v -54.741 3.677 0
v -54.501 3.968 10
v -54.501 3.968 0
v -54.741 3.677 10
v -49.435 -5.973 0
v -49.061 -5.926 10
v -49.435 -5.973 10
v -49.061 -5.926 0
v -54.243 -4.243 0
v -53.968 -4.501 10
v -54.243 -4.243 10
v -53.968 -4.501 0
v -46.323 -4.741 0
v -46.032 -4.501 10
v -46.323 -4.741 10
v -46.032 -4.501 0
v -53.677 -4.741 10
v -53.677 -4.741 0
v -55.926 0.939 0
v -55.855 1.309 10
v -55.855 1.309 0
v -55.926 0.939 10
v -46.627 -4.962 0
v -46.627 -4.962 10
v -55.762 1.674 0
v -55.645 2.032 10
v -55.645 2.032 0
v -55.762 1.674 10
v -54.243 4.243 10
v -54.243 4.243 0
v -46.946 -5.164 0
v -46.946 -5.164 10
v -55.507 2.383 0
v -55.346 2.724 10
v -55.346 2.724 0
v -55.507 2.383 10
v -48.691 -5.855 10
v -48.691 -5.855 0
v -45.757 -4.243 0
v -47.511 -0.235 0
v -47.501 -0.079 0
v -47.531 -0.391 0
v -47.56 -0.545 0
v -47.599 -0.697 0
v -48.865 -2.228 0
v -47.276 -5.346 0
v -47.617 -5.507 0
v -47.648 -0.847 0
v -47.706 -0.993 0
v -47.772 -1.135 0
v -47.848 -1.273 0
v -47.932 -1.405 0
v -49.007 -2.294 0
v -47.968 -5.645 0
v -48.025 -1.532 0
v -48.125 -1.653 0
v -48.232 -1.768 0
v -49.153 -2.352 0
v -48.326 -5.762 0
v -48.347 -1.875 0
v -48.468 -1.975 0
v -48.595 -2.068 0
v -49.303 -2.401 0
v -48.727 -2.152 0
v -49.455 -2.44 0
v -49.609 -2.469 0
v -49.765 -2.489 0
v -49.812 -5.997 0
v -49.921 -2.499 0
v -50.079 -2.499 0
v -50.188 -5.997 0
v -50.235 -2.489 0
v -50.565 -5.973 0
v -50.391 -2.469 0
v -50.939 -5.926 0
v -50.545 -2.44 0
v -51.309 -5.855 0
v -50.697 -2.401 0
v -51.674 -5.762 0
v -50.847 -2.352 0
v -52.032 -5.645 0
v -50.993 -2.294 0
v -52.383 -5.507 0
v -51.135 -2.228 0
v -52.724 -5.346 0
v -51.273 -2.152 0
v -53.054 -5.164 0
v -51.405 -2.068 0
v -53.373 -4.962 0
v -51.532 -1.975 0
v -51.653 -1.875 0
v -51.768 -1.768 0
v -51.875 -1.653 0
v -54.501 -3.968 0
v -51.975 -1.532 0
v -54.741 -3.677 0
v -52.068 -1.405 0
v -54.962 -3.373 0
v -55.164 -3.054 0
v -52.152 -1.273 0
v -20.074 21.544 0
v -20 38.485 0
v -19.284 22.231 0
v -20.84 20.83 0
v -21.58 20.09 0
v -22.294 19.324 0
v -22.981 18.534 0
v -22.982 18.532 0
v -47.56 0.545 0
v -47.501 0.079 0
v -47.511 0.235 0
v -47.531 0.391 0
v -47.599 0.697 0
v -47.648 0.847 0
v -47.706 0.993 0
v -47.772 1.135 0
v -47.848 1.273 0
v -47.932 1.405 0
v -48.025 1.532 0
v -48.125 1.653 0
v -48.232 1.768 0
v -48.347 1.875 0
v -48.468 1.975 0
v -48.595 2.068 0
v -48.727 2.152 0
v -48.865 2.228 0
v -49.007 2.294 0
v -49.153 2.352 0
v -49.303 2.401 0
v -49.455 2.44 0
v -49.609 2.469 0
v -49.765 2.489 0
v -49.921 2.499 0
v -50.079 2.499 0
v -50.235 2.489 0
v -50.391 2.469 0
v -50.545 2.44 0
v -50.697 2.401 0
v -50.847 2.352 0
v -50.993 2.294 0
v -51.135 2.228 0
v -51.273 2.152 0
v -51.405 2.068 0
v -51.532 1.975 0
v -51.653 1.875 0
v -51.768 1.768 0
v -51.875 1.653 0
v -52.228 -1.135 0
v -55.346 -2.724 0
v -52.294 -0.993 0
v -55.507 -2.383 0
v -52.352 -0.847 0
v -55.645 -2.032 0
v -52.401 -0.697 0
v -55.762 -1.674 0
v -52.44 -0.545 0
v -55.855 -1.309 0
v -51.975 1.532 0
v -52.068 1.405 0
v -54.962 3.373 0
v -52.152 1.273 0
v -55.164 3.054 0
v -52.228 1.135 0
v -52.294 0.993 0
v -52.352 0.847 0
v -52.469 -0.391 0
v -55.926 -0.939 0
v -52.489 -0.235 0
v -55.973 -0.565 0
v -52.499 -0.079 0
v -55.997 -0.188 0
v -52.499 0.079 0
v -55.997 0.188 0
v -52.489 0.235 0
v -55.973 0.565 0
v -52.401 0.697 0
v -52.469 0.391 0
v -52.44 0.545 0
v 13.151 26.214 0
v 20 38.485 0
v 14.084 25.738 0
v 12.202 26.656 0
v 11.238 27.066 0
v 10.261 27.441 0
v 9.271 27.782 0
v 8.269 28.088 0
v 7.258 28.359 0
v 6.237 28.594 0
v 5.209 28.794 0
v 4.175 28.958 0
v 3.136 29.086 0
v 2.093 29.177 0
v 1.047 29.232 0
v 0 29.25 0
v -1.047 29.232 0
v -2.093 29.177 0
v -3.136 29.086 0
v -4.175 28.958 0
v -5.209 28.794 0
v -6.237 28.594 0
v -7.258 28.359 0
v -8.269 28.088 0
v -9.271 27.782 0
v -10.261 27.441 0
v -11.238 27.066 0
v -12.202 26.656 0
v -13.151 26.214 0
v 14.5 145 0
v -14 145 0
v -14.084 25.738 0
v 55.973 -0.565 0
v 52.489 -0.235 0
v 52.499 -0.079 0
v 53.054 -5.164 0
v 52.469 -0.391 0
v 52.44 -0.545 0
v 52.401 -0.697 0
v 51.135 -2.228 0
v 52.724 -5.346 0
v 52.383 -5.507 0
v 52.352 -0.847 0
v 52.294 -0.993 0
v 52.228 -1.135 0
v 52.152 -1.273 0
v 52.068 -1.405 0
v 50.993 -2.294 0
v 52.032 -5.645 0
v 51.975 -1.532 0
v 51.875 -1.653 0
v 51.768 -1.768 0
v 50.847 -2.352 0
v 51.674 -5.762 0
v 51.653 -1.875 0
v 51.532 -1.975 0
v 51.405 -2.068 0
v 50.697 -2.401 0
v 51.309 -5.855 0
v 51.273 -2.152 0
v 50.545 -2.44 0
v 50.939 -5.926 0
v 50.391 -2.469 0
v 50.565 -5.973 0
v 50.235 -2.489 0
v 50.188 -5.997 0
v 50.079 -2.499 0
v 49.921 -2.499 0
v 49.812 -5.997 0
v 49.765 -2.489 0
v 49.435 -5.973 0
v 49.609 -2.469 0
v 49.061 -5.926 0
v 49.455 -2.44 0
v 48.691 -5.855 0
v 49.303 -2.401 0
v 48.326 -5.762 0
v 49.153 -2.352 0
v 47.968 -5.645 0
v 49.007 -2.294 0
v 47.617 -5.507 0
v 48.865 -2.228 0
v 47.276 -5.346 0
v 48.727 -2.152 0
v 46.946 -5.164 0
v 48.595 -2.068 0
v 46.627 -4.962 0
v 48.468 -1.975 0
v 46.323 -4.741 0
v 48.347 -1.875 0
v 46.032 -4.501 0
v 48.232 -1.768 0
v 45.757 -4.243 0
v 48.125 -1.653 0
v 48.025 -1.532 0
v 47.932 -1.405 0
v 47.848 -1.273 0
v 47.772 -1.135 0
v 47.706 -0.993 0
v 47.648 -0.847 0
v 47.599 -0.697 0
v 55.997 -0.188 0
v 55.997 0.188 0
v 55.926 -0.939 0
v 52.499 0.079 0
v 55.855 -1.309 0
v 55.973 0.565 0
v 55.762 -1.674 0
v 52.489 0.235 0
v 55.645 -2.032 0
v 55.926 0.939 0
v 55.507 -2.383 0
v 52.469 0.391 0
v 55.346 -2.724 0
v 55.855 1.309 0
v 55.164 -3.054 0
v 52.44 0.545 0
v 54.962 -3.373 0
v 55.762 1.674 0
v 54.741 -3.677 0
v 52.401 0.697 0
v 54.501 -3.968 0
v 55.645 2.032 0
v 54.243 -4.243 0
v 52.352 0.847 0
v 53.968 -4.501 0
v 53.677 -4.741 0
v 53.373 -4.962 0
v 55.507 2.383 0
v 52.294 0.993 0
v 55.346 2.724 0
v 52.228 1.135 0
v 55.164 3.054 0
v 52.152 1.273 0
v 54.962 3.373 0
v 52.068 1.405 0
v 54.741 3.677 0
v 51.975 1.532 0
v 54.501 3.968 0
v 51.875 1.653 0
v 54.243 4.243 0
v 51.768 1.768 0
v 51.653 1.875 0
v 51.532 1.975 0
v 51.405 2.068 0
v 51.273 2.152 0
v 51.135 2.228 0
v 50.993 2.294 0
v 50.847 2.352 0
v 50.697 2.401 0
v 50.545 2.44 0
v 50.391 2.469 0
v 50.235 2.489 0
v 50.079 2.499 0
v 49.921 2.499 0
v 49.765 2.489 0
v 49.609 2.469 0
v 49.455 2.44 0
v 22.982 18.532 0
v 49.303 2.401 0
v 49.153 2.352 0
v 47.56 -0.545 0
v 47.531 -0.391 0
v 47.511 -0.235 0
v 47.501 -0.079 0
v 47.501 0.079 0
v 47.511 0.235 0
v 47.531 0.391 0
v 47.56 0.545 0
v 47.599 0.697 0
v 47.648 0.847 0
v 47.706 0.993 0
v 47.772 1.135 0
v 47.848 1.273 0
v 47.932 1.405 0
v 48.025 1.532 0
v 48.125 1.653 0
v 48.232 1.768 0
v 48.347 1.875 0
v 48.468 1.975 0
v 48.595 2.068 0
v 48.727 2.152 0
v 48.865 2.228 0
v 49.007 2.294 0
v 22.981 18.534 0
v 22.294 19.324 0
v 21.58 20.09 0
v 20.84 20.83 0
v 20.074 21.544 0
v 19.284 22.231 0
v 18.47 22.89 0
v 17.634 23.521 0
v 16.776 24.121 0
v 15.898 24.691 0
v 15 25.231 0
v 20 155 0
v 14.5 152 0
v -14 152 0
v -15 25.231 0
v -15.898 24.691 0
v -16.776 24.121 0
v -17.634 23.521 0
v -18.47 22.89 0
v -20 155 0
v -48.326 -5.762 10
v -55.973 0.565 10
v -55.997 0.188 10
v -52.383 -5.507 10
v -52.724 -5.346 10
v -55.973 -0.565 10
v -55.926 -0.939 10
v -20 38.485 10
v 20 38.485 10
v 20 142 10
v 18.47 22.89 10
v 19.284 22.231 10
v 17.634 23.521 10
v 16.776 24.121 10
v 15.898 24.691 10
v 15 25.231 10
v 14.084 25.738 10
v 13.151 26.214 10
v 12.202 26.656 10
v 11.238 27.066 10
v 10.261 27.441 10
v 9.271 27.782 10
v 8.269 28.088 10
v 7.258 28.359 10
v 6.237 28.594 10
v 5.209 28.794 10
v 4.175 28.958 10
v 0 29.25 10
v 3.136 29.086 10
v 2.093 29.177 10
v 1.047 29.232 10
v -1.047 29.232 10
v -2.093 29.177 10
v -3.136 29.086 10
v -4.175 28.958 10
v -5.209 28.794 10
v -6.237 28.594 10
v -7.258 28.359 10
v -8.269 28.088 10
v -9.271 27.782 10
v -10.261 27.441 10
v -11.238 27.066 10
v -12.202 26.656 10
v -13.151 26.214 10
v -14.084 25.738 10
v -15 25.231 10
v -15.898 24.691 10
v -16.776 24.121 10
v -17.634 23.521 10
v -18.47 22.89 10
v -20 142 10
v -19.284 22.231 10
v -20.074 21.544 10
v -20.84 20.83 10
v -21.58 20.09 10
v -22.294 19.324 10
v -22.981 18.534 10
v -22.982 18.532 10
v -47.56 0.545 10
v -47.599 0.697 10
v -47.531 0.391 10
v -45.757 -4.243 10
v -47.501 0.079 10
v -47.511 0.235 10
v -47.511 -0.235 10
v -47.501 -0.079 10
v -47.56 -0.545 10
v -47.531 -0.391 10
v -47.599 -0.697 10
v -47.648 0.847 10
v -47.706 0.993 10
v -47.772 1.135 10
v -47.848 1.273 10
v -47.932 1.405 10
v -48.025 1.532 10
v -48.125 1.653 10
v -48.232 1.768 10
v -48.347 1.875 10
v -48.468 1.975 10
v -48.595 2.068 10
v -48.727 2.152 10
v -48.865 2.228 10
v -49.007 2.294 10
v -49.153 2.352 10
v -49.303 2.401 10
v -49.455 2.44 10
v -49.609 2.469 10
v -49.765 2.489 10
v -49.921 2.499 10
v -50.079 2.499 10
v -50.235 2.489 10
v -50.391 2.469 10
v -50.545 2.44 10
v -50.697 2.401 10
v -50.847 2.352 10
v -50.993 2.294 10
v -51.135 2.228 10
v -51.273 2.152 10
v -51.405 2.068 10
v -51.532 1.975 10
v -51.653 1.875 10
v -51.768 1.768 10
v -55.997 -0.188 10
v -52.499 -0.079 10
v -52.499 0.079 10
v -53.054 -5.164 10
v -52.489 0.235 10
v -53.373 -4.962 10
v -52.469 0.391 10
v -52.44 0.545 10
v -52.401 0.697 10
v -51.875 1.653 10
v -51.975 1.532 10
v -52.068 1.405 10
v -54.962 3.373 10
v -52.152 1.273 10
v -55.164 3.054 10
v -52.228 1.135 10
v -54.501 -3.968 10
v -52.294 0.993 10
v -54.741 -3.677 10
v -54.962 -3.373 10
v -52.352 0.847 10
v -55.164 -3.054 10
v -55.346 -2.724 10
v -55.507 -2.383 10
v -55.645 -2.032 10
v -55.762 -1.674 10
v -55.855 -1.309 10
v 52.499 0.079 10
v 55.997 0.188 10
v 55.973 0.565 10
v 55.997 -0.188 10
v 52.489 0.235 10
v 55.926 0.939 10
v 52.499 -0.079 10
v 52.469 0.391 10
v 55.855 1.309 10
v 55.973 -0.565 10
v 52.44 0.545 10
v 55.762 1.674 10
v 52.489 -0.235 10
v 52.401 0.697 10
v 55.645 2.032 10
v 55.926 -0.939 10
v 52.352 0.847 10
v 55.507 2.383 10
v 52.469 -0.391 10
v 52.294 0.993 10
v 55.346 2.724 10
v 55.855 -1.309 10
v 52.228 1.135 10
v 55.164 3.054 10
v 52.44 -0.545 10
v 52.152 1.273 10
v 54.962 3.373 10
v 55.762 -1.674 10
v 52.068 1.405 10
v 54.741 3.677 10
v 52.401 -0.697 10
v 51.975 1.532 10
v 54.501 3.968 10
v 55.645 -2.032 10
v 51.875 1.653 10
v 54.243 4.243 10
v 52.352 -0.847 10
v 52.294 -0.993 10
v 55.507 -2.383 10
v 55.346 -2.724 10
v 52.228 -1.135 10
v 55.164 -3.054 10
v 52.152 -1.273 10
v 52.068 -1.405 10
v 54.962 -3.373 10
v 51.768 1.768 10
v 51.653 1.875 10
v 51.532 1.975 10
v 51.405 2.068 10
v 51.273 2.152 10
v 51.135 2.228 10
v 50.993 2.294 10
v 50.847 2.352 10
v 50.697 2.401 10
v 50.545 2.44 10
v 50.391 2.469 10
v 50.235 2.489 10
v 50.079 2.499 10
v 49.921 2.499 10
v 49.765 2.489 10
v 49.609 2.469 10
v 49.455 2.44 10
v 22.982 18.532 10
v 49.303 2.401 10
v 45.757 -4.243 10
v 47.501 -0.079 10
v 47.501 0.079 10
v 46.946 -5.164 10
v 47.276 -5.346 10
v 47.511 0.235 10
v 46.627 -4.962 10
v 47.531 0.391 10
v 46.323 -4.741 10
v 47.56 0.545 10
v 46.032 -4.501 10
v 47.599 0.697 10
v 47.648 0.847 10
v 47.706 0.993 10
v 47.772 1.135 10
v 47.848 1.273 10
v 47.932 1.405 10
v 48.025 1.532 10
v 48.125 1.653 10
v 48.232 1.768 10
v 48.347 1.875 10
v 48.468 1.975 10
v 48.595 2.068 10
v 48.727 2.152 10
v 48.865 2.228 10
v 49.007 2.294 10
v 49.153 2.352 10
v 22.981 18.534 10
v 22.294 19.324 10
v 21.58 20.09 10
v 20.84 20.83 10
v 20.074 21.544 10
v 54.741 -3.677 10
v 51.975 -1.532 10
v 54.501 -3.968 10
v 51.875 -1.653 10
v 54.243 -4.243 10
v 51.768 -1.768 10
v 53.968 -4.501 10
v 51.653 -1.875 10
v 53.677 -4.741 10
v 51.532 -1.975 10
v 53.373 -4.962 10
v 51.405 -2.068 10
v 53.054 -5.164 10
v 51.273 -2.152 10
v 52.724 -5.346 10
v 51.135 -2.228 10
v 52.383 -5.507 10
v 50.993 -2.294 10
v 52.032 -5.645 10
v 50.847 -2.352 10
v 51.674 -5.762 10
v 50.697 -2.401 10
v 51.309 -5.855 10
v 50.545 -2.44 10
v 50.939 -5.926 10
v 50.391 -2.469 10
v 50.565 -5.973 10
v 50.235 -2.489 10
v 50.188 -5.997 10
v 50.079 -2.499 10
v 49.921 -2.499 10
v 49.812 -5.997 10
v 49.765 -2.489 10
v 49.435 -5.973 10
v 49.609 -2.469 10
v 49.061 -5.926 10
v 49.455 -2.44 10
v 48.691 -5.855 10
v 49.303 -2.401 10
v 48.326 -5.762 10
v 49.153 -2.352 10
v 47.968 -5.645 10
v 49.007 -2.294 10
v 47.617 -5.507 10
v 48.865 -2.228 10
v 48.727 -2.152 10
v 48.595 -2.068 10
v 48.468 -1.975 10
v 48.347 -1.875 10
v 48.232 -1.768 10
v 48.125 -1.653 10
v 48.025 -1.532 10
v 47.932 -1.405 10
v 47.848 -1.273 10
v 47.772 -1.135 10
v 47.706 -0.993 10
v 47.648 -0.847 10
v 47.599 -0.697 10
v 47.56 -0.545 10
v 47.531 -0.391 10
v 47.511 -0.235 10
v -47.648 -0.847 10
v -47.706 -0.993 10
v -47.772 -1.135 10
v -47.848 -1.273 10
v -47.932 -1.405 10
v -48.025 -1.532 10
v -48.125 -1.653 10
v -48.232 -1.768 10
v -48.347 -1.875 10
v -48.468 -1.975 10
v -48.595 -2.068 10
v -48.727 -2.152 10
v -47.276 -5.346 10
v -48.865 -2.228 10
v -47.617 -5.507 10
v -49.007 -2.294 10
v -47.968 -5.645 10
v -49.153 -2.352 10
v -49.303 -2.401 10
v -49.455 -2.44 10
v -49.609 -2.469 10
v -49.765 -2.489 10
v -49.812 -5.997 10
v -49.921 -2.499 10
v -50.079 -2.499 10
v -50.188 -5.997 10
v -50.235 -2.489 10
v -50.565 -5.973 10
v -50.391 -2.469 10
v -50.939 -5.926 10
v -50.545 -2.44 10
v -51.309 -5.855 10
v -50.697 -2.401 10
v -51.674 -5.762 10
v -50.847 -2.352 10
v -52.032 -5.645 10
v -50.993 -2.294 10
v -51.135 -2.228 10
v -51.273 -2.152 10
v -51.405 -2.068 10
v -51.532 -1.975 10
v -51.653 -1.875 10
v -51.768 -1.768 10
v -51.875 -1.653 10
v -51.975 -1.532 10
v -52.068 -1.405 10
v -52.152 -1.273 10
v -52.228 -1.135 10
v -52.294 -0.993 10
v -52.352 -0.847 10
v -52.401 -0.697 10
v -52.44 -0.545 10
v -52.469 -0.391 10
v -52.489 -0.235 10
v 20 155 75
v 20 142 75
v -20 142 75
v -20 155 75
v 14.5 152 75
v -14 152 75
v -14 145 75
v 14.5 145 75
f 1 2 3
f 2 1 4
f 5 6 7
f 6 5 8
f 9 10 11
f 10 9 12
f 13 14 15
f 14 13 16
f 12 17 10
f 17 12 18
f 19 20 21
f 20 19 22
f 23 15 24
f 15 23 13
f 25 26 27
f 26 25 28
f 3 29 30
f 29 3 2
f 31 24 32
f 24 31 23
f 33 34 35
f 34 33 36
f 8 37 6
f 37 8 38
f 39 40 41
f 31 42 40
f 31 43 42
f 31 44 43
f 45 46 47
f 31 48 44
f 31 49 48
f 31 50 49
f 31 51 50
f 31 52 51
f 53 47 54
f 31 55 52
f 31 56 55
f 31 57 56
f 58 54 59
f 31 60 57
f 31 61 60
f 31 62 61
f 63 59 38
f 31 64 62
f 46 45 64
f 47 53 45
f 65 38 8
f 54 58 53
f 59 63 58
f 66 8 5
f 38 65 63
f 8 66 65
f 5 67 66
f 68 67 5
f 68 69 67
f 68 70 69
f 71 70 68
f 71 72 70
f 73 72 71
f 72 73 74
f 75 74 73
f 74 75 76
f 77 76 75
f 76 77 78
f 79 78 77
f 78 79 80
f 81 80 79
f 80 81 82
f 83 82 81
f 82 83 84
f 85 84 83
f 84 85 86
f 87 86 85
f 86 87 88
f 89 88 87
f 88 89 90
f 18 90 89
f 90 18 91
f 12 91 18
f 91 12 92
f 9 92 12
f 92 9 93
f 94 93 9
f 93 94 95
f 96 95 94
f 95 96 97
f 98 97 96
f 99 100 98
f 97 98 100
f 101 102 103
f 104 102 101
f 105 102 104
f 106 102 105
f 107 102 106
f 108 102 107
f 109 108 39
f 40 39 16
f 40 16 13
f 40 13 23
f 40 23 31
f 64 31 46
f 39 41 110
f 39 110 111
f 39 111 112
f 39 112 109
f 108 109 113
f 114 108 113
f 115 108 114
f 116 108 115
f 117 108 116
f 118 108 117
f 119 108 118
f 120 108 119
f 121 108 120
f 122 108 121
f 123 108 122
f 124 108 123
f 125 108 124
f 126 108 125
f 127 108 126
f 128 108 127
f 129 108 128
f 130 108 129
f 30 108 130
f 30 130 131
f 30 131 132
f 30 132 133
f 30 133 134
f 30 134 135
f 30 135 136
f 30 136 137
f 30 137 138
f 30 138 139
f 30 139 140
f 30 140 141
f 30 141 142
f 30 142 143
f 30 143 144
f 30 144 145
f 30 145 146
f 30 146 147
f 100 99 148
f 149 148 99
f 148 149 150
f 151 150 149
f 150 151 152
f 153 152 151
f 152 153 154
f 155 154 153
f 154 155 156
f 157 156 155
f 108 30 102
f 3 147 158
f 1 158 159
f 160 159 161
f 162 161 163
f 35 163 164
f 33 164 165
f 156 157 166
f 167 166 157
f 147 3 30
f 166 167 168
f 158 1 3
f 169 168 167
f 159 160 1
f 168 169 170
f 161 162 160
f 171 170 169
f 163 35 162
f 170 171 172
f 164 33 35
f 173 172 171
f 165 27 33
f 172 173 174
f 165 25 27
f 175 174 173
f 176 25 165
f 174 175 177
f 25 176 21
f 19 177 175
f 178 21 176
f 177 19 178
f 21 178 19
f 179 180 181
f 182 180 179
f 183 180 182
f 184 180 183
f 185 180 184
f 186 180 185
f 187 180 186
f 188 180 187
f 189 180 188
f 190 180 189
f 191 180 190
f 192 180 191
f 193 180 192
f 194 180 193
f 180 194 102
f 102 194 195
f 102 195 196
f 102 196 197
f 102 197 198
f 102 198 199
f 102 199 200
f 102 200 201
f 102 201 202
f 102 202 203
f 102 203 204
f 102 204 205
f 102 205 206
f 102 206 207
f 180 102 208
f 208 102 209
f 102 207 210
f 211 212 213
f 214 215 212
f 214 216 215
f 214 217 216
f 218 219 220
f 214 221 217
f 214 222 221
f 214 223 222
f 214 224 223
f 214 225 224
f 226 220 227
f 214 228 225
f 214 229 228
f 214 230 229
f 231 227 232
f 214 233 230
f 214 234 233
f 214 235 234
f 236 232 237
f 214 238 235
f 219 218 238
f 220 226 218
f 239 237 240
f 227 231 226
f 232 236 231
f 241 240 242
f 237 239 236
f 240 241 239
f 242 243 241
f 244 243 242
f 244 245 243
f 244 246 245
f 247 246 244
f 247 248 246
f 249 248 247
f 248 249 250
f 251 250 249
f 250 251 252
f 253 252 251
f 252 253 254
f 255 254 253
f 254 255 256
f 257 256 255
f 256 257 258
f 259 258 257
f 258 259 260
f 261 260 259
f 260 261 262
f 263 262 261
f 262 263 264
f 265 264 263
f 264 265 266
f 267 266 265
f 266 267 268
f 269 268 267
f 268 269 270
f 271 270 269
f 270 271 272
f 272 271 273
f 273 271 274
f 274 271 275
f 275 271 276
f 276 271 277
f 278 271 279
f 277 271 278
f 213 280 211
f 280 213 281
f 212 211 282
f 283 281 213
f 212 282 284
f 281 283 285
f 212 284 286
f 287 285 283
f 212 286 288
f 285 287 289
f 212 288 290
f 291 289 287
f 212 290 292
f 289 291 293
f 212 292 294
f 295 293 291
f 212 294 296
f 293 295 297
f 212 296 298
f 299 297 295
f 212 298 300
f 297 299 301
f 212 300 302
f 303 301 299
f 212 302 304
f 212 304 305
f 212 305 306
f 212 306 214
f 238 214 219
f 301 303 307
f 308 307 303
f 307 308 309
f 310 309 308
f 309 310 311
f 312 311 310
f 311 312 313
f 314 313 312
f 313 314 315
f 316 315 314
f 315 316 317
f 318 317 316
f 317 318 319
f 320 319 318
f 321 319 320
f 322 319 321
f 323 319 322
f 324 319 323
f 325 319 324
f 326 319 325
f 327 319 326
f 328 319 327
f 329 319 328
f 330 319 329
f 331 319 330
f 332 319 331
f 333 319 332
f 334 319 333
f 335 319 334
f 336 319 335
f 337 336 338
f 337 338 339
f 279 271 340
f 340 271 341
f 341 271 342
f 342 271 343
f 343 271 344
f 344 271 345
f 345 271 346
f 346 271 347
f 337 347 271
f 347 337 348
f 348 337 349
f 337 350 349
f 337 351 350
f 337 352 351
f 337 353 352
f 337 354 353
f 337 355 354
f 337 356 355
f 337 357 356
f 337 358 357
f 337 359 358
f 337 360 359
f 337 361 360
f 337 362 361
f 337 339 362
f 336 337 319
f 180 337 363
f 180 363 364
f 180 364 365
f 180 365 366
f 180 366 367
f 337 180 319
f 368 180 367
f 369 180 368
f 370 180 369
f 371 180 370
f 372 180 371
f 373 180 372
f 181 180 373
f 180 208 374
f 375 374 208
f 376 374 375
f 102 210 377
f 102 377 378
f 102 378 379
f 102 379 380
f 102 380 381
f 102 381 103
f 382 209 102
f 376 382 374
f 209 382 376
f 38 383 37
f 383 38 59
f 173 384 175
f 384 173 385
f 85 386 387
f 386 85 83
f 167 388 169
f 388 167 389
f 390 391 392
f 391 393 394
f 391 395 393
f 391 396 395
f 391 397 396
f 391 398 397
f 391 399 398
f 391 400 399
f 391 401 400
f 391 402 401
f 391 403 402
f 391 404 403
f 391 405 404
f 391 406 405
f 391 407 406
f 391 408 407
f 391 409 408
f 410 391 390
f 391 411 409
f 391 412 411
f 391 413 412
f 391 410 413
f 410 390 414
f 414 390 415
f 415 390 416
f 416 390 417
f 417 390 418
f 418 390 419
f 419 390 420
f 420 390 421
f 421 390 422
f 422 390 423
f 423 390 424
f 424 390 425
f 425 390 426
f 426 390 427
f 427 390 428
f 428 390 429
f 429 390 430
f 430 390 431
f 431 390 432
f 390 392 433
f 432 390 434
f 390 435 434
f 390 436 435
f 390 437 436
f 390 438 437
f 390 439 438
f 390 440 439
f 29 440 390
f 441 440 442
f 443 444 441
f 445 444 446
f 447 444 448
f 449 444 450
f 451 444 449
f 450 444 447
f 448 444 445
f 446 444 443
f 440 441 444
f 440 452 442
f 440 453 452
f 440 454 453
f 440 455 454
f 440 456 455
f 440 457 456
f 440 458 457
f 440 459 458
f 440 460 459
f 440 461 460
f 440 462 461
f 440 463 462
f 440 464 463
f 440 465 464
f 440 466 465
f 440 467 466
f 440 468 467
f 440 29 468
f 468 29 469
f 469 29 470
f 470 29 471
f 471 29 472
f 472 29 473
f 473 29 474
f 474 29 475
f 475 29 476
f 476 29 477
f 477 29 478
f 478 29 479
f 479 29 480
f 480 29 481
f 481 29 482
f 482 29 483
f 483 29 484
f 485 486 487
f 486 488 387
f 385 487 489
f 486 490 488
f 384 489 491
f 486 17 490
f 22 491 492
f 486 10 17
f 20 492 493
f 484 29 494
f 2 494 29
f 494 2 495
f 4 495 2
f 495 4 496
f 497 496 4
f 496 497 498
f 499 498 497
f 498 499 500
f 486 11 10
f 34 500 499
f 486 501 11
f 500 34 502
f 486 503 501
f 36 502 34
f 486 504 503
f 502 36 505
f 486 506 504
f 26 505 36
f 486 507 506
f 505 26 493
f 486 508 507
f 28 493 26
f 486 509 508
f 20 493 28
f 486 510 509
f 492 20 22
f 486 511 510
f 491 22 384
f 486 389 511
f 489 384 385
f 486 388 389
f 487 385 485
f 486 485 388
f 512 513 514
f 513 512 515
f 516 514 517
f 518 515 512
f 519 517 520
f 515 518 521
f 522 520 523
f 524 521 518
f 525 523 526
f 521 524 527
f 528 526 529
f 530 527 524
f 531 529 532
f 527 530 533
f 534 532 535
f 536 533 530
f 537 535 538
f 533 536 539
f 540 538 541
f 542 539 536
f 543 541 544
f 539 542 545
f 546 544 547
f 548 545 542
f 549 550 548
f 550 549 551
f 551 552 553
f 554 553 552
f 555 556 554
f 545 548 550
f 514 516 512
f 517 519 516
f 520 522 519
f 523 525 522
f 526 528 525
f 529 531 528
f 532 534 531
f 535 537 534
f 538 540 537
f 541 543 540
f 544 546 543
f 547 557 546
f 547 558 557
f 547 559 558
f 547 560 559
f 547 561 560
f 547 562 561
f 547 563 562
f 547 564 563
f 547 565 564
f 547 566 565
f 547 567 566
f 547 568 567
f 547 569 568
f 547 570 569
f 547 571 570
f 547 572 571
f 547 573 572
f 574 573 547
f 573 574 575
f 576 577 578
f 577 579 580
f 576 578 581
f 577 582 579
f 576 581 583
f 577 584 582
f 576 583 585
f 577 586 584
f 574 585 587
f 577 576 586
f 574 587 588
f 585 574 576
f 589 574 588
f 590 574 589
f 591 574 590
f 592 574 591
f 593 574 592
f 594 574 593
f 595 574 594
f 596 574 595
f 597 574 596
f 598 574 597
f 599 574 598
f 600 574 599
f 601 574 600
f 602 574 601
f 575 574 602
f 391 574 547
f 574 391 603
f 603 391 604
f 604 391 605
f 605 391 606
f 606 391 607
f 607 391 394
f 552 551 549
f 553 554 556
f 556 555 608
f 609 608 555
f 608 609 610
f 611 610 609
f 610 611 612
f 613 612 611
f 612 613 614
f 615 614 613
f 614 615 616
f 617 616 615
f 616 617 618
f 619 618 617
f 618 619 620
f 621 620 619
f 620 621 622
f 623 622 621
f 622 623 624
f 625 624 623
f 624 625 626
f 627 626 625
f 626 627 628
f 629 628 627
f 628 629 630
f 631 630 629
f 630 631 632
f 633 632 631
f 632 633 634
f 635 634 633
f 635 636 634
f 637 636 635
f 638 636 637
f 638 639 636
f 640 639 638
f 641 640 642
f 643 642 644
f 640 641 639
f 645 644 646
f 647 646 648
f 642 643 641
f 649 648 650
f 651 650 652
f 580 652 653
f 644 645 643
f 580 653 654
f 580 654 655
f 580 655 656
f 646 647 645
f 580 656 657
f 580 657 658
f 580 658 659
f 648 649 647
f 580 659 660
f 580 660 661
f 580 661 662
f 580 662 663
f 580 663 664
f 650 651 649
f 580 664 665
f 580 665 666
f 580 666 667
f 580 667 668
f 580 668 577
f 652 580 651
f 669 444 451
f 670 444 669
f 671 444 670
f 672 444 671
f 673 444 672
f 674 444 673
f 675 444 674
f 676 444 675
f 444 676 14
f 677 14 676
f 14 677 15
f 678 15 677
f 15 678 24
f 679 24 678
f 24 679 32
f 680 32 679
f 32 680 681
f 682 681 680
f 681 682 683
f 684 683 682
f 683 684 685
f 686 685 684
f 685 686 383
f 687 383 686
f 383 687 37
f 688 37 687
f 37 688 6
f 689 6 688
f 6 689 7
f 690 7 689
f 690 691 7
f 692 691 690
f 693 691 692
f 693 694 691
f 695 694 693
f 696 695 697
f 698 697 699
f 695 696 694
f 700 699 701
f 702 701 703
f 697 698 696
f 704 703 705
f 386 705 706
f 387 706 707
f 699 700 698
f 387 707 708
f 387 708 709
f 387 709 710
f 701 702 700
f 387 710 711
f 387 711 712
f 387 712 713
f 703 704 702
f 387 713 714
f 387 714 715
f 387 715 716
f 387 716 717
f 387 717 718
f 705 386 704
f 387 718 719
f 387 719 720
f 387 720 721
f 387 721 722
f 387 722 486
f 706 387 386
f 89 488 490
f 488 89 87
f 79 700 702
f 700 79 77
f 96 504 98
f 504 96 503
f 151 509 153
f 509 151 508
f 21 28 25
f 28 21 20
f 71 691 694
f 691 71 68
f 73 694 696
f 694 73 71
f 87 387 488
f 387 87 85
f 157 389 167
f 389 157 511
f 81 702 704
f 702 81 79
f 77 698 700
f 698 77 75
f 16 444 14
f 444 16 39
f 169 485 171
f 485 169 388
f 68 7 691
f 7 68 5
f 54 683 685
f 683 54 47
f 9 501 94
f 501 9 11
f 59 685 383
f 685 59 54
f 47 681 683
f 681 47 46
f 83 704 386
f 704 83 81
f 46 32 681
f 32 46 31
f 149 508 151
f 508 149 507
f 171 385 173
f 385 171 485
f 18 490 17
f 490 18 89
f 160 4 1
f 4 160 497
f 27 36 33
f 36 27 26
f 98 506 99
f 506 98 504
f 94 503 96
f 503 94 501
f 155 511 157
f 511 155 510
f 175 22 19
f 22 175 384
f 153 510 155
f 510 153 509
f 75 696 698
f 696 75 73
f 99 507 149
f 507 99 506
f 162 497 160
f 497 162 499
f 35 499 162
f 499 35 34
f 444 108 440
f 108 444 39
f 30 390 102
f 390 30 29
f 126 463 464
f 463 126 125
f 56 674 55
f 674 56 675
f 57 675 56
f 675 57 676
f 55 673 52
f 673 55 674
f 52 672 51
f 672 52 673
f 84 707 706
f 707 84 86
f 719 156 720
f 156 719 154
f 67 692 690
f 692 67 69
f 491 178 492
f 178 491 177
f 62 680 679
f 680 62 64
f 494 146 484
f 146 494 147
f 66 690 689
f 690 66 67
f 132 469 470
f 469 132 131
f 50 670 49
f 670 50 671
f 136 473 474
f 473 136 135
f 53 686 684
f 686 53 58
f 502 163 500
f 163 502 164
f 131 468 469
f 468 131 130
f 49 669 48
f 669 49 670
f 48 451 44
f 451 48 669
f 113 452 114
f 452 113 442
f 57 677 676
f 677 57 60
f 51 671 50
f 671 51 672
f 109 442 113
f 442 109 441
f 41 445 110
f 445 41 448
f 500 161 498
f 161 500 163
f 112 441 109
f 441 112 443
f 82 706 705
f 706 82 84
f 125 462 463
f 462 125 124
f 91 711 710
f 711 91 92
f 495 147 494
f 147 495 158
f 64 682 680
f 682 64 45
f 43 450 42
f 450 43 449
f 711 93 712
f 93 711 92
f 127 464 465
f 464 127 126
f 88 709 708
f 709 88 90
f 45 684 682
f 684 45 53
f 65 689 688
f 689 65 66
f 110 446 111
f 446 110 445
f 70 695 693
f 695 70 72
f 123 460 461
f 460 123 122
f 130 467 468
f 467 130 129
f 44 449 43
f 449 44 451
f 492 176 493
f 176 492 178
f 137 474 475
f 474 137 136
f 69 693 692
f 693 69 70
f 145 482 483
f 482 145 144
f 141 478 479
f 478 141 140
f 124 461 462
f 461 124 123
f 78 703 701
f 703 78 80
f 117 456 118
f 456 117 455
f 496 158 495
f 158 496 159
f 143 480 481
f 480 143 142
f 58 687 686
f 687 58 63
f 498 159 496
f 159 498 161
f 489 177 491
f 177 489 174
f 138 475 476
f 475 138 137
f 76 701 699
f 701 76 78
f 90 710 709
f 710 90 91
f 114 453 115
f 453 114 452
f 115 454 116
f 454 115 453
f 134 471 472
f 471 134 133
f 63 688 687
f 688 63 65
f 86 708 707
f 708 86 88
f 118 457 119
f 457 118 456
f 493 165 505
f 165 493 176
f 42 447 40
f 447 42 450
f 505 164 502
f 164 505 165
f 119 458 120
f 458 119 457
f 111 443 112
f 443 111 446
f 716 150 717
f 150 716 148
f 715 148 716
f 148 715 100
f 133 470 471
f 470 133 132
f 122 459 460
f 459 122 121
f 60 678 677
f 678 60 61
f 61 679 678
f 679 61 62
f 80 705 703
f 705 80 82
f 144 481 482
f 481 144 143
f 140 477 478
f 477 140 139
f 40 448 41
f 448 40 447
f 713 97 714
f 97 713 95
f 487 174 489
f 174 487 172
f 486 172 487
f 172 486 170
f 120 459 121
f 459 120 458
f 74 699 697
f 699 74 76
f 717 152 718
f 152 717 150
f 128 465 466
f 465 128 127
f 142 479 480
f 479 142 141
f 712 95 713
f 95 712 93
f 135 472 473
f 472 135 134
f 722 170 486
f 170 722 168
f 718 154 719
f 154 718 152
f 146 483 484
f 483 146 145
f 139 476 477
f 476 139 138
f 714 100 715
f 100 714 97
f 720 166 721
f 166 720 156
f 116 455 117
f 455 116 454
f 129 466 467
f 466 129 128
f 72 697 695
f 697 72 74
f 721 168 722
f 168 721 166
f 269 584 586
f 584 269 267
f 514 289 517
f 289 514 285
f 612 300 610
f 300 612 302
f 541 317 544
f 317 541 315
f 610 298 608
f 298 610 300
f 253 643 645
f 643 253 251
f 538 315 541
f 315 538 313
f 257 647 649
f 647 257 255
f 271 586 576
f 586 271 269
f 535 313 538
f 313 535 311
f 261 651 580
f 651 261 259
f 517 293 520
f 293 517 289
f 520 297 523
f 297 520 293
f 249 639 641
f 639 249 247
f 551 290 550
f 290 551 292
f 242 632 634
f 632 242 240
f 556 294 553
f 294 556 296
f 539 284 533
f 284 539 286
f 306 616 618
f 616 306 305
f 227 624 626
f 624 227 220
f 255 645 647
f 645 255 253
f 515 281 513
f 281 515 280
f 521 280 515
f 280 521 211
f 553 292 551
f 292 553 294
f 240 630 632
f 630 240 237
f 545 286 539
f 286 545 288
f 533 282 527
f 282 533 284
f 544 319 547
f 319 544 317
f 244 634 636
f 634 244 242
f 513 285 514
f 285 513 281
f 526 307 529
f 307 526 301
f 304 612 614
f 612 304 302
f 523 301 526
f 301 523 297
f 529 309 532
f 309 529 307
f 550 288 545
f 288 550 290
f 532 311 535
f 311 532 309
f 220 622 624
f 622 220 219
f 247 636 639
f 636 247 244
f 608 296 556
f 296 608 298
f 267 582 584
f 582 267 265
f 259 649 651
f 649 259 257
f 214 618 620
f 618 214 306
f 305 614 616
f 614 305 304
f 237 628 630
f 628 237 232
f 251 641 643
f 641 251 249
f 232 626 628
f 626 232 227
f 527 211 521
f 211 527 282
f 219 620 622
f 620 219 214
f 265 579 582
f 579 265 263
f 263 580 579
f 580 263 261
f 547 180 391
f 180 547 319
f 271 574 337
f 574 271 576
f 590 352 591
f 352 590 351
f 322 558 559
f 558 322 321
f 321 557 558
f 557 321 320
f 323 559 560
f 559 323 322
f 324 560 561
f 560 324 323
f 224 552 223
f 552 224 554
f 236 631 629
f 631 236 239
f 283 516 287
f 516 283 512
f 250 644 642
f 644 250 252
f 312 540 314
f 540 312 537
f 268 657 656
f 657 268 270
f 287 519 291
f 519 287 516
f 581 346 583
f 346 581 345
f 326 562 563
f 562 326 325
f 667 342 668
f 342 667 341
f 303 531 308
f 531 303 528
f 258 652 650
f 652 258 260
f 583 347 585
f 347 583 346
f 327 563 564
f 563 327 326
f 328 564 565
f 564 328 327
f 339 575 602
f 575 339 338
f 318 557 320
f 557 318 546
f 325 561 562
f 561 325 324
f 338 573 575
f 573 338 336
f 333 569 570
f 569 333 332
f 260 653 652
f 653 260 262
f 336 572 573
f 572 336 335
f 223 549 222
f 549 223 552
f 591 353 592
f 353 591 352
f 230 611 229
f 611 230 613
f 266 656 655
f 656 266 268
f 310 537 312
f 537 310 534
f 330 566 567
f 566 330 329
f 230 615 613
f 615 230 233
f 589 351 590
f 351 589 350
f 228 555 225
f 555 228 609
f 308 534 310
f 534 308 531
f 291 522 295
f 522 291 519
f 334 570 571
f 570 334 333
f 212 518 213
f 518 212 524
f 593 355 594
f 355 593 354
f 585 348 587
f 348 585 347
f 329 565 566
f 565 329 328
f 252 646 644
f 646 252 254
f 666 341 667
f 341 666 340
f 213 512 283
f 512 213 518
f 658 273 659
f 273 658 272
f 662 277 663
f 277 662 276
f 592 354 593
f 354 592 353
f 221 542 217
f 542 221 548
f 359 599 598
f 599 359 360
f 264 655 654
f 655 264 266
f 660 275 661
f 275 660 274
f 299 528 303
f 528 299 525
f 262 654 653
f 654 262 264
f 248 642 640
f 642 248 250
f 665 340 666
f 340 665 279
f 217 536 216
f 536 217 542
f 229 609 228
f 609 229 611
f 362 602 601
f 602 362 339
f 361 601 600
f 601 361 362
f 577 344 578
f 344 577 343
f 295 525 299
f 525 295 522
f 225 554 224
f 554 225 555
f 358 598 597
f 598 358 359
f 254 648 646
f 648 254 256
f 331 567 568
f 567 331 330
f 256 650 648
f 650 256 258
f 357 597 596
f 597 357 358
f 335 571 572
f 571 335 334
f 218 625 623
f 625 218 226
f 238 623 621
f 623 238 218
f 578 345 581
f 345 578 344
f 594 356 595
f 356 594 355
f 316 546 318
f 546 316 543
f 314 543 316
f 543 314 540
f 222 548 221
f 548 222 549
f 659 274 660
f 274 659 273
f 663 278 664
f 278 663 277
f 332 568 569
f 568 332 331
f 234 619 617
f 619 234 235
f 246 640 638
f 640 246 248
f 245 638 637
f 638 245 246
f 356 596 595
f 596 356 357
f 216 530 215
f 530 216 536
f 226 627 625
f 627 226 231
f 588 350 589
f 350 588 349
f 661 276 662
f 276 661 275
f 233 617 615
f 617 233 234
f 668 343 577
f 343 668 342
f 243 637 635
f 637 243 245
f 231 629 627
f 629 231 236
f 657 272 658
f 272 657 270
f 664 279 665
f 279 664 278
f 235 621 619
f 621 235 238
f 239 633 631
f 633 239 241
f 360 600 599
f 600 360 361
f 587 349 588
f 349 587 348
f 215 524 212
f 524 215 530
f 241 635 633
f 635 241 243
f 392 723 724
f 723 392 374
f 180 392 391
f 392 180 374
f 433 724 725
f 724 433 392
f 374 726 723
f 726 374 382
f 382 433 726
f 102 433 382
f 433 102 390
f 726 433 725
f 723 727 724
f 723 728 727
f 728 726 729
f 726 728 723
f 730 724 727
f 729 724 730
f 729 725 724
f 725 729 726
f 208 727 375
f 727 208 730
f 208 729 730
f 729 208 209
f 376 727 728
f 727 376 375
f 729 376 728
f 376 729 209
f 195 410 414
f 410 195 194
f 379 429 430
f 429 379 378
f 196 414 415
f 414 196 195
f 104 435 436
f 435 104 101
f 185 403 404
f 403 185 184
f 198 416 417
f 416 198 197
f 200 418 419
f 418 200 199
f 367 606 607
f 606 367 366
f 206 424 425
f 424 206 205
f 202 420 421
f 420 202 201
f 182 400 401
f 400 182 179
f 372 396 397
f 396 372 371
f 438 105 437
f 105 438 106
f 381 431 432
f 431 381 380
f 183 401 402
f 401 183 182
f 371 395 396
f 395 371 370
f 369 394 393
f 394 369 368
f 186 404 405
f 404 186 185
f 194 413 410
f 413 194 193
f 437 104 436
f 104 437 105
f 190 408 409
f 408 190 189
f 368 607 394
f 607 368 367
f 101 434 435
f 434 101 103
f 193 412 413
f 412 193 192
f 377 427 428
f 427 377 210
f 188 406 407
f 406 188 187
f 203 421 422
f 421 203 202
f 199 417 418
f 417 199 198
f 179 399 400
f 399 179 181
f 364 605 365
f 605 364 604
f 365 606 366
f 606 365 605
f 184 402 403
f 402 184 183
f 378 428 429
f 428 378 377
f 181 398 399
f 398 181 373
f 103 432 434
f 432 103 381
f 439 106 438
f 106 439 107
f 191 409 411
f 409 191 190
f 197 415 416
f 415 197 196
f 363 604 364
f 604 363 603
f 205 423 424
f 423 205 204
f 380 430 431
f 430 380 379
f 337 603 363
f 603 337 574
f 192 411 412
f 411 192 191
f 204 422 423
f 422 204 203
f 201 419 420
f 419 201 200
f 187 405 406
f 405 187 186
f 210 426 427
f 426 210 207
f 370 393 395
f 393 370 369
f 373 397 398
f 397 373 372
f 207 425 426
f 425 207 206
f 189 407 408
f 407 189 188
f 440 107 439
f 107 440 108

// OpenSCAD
vesaGap=100;
monitorGap=140-18;
depth=10;
vesaArmWidth=12;
bodyWidth=40;

difference() {
    union () {
        rotate_about_pt(-45, 0, [-vesaGap/2, 0, 0])
        translate([-vesaGap/2, 0, 0])
        vesaEnd();

        rotate_about_pt(45, 0, [vesaGap/2, 0, 0])
        translate([vesaGap/2, 0, 0])
        vesaEnd();
        
        vesaBody();
        
        translate([0, 58, 0])
        magsafeArm();
    }
    
    translate([0, -.75, 0])
    cylinder(depth, d=60, $fn=180);
}

module vesaEnd() { 
    difference() {
        union() {
            cylinder(h=depth, d=vesaArmWidth, $fn=100);
    
            translate([-vesaArmWidth/2, 0, 0])
                cube([vesaArmWidth, 50, depth]);
        }
        
        cylinder(h=depth, d=5, $fn=100);
    }
}

module vesaBody() {
    union() {
        translate([-bodyWidth/2, 20, 0])
        cube([bodyWidth, monitorGap, depth]);
    }
}

module magsafeArm() {
    depth=3;
    armDepth=7;
    armWidth=28.5;
    
    union() {        
        translate([-bodyWidth/2, 97, 0])
        rotate([90, 0, 0])
        difference() {
            cube([bodyWidth, 75, armDepth+depth*2]);
            
            translate([depth*2, 0, depth])
            cube([armWidth, 75, armDepth]);
        }
    }
}

module rotate_about_pt(z, y, pt) {
    translate(pt)
        rotate([0, y, z])
            translate(-pt)
                children();   
}
